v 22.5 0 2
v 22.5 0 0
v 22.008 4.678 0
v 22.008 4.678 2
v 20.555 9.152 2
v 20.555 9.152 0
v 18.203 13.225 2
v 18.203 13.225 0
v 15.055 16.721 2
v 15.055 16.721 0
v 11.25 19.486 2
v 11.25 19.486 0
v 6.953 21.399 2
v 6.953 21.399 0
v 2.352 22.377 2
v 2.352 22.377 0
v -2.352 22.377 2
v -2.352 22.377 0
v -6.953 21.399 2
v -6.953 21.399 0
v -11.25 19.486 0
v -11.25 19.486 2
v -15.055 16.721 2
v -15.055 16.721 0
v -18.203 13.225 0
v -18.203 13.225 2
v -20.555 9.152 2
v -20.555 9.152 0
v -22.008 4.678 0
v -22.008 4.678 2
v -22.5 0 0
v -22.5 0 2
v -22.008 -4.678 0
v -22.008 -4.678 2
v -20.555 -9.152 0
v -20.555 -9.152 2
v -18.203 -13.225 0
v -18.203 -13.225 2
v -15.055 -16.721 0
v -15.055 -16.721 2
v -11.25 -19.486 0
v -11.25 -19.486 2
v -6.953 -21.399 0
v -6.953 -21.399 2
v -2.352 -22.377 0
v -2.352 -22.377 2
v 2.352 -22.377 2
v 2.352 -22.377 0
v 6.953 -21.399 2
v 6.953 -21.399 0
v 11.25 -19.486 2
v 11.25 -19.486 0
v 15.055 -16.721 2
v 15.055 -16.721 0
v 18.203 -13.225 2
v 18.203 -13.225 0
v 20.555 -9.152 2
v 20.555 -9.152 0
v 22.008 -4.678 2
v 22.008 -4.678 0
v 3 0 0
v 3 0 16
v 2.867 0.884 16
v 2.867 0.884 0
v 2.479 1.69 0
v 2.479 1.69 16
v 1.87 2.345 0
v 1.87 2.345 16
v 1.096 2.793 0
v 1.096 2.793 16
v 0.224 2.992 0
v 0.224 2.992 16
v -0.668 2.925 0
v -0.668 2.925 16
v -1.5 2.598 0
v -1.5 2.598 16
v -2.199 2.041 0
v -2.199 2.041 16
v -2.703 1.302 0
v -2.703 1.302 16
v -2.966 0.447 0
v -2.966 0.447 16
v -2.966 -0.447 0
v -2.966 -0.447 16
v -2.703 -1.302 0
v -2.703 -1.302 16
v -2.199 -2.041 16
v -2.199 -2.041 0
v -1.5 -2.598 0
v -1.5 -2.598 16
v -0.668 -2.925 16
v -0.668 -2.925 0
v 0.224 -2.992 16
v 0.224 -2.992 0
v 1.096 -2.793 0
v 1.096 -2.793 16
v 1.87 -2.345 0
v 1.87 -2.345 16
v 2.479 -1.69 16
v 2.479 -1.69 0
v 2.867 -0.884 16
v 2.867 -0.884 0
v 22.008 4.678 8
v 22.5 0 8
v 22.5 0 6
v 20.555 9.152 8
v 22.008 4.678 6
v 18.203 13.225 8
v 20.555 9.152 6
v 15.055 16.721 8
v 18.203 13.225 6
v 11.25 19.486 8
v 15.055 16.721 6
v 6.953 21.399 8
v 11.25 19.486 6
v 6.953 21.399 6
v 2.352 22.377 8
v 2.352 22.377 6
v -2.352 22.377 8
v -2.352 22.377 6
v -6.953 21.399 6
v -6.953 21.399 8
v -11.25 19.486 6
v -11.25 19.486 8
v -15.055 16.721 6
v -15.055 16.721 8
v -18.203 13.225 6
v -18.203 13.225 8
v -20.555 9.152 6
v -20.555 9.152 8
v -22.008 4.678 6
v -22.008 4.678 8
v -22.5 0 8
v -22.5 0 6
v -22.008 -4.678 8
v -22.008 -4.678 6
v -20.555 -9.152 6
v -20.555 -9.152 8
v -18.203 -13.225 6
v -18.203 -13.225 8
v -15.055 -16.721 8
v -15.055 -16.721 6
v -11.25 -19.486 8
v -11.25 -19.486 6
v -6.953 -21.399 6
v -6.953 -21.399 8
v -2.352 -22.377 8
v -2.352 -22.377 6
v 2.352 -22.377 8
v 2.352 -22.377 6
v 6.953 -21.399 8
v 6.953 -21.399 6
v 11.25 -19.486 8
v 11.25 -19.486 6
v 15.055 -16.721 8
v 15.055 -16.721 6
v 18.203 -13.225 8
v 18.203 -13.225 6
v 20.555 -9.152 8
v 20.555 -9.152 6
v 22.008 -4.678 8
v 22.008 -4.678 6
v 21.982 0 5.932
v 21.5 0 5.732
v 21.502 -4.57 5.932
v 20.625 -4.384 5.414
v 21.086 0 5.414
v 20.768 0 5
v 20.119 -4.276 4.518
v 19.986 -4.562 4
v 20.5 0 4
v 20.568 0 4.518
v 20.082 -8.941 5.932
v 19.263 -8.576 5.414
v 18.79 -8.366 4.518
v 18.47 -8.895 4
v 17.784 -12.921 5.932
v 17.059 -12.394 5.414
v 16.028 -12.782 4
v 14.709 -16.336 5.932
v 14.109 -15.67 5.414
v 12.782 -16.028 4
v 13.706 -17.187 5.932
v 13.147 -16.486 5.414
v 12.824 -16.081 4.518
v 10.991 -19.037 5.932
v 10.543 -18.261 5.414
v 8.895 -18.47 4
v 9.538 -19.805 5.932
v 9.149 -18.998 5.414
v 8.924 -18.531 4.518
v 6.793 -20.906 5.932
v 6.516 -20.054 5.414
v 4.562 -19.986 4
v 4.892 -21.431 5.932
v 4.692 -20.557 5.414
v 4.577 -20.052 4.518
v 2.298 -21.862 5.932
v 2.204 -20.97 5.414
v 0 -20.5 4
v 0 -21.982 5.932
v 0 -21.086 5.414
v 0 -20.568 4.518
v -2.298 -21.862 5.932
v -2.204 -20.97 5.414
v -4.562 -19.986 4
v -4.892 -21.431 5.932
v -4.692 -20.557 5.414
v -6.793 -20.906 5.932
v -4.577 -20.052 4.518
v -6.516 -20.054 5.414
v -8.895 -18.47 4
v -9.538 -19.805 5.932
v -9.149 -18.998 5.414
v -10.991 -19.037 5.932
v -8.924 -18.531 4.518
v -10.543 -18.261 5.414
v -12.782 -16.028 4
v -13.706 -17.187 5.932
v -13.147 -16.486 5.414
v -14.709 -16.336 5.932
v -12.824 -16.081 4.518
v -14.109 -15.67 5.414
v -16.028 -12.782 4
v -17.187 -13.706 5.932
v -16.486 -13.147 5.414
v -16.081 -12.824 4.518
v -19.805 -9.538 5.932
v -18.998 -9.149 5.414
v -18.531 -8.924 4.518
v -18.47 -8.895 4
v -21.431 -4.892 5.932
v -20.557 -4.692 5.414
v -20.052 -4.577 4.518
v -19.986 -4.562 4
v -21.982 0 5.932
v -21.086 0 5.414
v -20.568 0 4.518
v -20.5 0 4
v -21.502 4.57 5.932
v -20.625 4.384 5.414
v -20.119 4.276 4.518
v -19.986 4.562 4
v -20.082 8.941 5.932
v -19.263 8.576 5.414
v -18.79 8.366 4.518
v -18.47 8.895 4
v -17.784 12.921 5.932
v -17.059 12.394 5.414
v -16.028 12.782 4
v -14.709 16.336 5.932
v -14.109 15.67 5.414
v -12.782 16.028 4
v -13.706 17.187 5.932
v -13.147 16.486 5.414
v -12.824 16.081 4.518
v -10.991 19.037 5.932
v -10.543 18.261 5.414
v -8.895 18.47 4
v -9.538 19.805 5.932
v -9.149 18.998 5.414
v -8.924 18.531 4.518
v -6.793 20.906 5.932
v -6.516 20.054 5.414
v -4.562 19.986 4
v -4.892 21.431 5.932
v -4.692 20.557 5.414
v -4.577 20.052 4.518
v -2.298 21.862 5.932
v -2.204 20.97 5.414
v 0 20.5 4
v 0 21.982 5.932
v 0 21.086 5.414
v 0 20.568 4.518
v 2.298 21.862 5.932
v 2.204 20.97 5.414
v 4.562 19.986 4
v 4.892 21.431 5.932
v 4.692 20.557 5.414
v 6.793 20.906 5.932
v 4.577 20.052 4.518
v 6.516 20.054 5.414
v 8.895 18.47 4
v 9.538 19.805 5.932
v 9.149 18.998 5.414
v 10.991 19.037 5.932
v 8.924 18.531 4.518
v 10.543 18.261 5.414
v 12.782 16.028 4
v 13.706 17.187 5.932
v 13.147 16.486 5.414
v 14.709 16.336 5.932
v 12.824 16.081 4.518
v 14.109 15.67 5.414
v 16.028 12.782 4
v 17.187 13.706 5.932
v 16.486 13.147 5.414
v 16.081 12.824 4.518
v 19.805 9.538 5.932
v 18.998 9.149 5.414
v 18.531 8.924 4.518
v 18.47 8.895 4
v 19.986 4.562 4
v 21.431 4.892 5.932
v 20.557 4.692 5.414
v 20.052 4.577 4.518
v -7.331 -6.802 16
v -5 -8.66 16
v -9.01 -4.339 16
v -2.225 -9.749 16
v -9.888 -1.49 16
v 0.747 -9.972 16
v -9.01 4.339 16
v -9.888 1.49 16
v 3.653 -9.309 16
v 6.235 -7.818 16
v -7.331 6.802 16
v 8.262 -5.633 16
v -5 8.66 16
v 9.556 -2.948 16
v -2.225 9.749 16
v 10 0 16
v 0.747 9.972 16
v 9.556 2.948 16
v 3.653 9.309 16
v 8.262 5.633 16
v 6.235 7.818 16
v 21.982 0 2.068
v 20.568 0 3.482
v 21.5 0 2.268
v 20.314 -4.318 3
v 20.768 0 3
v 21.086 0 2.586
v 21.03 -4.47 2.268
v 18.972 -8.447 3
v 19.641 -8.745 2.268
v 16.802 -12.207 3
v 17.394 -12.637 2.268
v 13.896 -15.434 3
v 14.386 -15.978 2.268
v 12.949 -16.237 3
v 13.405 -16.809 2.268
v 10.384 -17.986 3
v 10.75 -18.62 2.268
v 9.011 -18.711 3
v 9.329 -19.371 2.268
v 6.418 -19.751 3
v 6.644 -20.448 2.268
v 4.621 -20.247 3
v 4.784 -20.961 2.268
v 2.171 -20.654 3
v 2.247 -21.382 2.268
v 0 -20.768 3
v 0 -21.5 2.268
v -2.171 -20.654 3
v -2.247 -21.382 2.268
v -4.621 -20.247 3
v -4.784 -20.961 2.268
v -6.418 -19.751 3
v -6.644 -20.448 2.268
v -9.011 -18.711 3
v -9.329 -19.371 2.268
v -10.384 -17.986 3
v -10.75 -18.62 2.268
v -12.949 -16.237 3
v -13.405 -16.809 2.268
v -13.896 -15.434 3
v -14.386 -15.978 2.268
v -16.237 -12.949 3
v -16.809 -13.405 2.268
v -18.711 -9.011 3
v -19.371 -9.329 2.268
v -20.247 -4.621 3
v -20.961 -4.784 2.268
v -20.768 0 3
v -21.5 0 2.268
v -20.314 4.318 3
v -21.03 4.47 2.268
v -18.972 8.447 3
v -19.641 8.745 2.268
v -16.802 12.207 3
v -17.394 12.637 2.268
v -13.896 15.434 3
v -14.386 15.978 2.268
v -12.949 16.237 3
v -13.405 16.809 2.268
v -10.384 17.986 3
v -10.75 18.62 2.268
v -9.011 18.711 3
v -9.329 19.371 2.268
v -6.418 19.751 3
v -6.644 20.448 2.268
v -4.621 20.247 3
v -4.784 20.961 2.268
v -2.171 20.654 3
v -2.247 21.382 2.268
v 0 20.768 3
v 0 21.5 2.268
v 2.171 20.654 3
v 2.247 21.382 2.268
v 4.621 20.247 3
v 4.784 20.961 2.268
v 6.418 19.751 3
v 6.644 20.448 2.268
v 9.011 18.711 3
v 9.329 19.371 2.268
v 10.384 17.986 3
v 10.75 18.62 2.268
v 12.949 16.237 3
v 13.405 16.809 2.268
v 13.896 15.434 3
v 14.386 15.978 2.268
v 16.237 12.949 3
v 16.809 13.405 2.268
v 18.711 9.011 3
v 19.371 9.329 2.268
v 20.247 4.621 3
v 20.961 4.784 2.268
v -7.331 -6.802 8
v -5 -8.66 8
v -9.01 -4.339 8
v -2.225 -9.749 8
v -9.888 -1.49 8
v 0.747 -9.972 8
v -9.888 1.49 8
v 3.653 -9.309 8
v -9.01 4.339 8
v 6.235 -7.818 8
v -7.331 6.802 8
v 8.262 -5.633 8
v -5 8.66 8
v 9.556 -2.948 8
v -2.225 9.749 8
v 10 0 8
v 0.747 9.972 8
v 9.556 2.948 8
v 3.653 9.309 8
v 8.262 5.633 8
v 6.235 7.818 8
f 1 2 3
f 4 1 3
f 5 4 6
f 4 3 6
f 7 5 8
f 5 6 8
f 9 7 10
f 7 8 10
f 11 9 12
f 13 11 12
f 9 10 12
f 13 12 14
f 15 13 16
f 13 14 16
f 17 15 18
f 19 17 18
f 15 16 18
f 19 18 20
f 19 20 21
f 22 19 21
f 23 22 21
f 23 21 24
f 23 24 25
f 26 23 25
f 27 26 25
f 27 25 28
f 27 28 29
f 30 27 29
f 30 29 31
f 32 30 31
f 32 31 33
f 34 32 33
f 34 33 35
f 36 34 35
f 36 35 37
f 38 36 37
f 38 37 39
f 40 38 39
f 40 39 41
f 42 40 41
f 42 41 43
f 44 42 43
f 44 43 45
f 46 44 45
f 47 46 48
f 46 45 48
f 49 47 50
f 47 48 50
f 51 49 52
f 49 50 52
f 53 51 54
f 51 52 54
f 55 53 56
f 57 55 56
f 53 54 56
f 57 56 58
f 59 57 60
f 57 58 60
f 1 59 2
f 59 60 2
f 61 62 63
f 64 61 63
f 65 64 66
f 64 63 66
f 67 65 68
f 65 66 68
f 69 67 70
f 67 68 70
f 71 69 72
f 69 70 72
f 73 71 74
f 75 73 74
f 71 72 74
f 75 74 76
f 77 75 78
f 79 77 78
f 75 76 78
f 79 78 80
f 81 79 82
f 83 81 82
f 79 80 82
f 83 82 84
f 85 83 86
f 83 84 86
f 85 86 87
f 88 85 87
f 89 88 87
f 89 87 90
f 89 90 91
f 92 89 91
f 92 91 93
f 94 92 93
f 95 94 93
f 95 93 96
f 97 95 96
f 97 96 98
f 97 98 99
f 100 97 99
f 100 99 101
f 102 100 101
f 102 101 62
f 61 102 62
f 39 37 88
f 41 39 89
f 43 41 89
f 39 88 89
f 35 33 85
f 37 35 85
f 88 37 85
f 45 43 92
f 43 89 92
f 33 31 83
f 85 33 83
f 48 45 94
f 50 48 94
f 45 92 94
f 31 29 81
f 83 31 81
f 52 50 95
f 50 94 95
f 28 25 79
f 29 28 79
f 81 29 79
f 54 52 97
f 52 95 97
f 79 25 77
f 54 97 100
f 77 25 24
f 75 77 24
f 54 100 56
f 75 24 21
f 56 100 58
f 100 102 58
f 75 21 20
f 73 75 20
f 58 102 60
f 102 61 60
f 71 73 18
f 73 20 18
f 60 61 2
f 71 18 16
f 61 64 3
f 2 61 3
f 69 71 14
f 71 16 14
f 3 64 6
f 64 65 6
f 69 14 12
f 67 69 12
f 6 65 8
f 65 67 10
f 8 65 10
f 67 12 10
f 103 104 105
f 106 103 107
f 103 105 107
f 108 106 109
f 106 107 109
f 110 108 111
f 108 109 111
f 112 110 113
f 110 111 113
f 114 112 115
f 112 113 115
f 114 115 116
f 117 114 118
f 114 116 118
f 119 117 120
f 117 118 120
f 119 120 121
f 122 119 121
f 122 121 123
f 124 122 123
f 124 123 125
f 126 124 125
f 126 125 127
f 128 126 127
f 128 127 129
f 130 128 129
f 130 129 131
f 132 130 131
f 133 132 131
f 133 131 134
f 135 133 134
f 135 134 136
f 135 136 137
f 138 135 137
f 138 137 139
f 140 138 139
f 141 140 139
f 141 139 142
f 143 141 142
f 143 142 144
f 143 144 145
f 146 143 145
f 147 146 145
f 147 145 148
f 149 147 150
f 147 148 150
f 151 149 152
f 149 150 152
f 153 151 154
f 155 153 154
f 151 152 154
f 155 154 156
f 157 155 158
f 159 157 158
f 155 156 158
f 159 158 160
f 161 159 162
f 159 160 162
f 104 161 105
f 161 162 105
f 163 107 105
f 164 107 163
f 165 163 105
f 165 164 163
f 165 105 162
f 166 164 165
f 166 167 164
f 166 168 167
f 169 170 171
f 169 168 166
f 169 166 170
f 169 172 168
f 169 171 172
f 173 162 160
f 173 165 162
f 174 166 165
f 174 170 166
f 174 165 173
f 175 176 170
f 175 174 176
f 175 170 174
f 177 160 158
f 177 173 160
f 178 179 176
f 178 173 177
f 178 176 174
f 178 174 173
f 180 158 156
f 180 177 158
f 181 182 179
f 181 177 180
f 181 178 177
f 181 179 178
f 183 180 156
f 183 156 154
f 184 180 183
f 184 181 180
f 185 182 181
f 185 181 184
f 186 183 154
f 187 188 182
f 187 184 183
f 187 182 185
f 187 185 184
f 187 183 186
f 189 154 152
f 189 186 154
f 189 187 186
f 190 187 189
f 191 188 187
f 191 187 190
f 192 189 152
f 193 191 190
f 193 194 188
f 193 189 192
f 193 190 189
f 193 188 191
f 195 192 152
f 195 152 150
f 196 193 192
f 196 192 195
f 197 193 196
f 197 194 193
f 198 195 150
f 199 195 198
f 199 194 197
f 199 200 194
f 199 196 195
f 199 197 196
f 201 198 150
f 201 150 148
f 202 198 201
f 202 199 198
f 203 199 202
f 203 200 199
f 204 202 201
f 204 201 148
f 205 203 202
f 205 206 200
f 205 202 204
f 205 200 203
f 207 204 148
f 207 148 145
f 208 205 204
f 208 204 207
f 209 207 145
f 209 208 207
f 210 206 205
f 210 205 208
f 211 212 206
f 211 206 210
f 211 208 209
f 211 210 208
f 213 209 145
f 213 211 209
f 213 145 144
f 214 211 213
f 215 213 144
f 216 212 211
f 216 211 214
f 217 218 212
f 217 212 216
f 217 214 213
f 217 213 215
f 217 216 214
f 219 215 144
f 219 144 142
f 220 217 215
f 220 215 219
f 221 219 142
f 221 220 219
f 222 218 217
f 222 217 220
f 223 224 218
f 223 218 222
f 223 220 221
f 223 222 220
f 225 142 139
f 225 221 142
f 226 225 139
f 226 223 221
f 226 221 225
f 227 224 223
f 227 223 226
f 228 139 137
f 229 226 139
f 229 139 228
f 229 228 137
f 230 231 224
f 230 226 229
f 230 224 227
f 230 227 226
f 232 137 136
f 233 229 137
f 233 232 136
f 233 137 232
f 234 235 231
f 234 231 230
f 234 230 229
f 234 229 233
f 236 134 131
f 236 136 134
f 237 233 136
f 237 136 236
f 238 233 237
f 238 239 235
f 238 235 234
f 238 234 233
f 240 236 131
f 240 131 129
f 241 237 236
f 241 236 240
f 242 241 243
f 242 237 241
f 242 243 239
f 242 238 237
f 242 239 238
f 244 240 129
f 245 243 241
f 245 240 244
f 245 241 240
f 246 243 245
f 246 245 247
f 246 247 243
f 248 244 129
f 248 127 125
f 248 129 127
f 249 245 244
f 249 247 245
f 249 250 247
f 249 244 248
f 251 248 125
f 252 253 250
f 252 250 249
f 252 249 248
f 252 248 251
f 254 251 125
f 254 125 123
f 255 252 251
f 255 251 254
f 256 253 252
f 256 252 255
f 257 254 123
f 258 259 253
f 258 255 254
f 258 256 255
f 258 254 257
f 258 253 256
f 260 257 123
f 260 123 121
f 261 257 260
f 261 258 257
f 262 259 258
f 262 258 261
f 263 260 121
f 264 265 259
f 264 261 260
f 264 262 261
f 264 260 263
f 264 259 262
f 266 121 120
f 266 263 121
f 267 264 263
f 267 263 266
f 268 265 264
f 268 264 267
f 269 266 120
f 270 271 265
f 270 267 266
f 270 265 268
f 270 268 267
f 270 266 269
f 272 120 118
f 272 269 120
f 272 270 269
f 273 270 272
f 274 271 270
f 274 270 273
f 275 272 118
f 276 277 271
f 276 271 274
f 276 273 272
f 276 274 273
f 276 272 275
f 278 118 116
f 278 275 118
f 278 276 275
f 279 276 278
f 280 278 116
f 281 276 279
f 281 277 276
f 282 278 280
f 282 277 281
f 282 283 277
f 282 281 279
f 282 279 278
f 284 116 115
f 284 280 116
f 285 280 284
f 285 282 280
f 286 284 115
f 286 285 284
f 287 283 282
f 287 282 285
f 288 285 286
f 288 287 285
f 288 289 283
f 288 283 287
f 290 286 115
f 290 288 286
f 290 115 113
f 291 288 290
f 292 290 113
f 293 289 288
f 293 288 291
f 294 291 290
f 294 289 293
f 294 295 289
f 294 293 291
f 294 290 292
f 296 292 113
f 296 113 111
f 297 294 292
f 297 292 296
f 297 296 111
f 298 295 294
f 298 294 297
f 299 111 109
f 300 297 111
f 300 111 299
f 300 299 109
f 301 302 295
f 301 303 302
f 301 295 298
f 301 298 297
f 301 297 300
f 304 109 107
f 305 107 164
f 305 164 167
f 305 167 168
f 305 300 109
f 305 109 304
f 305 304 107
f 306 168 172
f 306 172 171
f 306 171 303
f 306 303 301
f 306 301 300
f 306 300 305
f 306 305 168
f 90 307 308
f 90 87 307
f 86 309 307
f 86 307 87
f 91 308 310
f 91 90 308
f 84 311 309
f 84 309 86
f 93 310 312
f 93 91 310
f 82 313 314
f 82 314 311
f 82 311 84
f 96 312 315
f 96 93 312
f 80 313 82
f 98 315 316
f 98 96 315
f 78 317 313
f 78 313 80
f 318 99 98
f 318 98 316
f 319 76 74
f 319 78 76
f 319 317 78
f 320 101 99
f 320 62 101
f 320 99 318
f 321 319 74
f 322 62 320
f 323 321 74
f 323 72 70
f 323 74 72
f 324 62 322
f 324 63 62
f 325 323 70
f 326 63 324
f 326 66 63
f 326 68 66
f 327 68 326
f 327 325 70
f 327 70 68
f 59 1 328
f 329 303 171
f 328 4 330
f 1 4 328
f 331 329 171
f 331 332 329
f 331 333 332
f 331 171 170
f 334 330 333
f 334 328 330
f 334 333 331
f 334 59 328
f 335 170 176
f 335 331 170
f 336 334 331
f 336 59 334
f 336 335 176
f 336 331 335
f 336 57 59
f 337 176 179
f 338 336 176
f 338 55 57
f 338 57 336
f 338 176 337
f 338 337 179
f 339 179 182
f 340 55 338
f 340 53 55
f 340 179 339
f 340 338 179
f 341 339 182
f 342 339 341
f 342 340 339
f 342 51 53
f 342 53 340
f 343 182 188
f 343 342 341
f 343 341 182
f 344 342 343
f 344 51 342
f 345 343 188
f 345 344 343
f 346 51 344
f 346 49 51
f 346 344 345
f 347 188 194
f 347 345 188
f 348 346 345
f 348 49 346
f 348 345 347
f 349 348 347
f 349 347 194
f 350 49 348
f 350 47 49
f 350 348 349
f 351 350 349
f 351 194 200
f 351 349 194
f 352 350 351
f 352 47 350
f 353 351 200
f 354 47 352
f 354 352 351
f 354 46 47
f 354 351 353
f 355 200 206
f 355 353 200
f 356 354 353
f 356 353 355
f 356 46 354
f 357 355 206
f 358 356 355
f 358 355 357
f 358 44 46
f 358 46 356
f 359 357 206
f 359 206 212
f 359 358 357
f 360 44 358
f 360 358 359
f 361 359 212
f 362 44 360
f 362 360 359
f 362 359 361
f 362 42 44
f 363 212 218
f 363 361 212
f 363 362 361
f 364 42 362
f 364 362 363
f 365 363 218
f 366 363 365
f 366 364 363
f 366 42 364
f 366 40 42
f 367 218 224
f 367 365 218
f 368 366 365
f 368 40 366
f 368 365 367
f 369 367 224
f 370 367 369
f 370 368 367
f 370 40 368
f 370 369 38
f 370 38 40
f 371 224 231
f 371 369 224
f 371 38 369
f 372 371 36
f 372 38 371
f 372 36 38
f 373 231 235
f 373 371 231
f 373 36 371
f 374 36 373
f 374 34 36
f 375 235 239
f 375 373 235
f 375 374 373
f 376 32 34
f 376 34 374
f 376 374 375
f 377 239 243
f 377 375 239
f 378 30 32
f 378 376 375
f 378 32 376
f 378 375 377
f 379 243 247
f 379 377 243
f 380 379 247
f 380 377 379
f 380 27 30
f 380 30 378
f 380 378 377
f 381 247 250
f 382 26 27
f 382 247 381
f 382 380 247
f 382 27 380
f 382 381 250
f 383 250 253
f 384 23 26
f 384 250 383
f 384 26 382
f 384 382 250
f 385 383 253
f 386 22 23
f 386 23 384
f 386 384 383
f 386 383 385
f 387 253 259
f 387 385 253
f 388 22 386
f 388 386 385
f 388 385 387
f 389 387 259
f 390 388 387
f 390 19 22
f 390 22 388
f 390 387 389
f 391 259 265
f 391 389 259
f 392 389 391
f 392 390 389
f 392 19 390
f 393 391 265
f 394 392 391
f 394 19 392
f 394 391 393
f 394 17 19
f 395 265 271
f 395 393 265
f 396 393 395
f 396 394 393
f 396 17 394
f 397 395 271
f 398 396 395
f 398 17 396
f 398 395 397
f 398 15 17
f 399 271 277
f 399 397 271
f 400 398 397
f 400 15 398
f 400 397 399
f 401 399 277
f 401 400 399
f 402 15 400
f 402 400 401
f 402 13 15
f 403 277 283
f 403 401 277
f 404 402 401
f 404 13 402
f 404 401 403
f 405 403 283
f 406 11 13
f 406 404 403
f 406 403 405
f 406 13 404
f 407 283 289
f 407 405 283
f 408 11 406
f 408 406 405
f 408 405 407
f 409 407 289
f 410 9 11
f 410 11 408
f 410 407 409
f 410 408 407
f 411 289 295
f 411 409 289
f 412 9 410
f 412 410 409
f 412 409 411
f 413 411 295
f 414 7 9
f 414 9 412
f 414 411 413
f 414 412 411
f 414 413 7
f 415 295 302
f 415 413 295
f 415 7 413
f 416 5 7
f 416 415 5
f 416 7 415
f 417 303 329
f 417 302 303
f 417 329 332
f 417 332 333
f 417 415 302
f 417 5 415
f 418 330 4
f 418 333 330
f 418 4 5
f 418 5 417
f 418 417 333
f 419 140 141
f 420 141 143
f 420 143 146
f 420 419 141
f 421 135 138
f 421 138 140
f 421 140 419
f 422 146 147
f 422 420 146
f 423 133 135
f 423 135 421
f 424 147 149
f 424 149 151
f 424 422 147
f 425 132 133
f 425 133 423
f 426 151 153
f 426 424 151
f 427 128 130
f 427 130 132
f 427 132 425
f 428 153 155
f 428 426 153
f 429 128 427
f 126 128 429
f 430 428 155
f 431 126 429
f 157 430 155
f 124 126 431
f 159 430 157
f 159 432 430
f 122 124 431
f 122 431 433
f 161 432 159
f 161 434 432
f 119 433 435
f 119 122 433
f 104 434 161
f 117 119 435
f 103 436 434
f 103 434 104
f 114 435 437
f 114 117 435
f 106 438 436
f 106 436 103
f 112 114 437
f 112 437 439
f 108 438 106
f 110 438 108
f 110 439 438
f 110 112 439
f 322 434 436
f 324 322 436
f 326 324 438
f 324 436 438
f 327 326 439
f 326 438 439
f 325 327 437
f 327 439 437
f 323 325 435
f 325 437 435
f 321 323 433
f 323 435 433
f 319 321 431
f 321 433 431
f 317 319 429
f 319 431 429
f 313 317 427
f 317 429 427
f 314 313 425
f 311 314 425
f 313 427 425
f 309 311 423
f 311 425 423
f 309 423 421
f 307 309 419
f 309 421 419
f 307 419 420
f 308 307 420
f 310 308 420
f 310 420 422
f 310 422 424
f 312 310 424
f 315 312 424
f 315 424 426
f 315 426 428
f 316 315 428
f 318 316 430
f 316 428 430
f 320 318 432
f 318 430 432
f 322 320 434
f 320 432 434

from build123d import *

# Parameters (mm, degrees)
SKETCH_1_R          = 22.5
EXTRUDE_1_DEPTH     = 8
SKETCH_2_R          = 2
SKETCH_3_R          = 10
EXTRUDE_2_DEPTH     = 8
SKETCH_4_R          = 3
CUT_EXTRUDE_1_DEPTH = 36.616007637


with BuildPart() as part:
    # 草图1 → 凸台-拉伸1 (new body)
    with BuildSketch(Plane.XY):
        Circle(SKETCH_1_R)
    extrude(amount=EXTRUDE_1_DEPTH)

    # 草图2 → 切除-旋转1 (revolve, cut)
    with BuildSketch(Plane(origin=(0, 0, 0), x_dir=(1, 0, 0), z_dir=(0, 1, 0)), mode=Mode.PRIVATE) as cut_revolve_1_sk:
        with Locations((-22.5, -4)):
            Circle(SKETCH_2_R)
    revolve(cut_revolve_1_sk.sketch.rotate(Axis((0, 0, 8), (0, 0, -1)), 180), axis=Axis((0, 0, 8), (0, 0, -1)), mode=Mode.SUBTRACT)

    # 草图3 → 凸台-拉伸2 (add)
    with BuildSketch(Plane.XY.offset(8)):
        Circle(SKETCH_3_R)
    extrude(amount=EXTRUDE_2_DEPTH)

    # 草图4 → 切除-拉伸1 (cut, through all)
    with BuildSketch(Plane.XY.offset(16)):
        Circle(SKETCH_4_R)
    extrude(amount=-CUT_EXTRUDE_1_DEPTH, mode=Mode.SUBTRACT)


solid = part.part
